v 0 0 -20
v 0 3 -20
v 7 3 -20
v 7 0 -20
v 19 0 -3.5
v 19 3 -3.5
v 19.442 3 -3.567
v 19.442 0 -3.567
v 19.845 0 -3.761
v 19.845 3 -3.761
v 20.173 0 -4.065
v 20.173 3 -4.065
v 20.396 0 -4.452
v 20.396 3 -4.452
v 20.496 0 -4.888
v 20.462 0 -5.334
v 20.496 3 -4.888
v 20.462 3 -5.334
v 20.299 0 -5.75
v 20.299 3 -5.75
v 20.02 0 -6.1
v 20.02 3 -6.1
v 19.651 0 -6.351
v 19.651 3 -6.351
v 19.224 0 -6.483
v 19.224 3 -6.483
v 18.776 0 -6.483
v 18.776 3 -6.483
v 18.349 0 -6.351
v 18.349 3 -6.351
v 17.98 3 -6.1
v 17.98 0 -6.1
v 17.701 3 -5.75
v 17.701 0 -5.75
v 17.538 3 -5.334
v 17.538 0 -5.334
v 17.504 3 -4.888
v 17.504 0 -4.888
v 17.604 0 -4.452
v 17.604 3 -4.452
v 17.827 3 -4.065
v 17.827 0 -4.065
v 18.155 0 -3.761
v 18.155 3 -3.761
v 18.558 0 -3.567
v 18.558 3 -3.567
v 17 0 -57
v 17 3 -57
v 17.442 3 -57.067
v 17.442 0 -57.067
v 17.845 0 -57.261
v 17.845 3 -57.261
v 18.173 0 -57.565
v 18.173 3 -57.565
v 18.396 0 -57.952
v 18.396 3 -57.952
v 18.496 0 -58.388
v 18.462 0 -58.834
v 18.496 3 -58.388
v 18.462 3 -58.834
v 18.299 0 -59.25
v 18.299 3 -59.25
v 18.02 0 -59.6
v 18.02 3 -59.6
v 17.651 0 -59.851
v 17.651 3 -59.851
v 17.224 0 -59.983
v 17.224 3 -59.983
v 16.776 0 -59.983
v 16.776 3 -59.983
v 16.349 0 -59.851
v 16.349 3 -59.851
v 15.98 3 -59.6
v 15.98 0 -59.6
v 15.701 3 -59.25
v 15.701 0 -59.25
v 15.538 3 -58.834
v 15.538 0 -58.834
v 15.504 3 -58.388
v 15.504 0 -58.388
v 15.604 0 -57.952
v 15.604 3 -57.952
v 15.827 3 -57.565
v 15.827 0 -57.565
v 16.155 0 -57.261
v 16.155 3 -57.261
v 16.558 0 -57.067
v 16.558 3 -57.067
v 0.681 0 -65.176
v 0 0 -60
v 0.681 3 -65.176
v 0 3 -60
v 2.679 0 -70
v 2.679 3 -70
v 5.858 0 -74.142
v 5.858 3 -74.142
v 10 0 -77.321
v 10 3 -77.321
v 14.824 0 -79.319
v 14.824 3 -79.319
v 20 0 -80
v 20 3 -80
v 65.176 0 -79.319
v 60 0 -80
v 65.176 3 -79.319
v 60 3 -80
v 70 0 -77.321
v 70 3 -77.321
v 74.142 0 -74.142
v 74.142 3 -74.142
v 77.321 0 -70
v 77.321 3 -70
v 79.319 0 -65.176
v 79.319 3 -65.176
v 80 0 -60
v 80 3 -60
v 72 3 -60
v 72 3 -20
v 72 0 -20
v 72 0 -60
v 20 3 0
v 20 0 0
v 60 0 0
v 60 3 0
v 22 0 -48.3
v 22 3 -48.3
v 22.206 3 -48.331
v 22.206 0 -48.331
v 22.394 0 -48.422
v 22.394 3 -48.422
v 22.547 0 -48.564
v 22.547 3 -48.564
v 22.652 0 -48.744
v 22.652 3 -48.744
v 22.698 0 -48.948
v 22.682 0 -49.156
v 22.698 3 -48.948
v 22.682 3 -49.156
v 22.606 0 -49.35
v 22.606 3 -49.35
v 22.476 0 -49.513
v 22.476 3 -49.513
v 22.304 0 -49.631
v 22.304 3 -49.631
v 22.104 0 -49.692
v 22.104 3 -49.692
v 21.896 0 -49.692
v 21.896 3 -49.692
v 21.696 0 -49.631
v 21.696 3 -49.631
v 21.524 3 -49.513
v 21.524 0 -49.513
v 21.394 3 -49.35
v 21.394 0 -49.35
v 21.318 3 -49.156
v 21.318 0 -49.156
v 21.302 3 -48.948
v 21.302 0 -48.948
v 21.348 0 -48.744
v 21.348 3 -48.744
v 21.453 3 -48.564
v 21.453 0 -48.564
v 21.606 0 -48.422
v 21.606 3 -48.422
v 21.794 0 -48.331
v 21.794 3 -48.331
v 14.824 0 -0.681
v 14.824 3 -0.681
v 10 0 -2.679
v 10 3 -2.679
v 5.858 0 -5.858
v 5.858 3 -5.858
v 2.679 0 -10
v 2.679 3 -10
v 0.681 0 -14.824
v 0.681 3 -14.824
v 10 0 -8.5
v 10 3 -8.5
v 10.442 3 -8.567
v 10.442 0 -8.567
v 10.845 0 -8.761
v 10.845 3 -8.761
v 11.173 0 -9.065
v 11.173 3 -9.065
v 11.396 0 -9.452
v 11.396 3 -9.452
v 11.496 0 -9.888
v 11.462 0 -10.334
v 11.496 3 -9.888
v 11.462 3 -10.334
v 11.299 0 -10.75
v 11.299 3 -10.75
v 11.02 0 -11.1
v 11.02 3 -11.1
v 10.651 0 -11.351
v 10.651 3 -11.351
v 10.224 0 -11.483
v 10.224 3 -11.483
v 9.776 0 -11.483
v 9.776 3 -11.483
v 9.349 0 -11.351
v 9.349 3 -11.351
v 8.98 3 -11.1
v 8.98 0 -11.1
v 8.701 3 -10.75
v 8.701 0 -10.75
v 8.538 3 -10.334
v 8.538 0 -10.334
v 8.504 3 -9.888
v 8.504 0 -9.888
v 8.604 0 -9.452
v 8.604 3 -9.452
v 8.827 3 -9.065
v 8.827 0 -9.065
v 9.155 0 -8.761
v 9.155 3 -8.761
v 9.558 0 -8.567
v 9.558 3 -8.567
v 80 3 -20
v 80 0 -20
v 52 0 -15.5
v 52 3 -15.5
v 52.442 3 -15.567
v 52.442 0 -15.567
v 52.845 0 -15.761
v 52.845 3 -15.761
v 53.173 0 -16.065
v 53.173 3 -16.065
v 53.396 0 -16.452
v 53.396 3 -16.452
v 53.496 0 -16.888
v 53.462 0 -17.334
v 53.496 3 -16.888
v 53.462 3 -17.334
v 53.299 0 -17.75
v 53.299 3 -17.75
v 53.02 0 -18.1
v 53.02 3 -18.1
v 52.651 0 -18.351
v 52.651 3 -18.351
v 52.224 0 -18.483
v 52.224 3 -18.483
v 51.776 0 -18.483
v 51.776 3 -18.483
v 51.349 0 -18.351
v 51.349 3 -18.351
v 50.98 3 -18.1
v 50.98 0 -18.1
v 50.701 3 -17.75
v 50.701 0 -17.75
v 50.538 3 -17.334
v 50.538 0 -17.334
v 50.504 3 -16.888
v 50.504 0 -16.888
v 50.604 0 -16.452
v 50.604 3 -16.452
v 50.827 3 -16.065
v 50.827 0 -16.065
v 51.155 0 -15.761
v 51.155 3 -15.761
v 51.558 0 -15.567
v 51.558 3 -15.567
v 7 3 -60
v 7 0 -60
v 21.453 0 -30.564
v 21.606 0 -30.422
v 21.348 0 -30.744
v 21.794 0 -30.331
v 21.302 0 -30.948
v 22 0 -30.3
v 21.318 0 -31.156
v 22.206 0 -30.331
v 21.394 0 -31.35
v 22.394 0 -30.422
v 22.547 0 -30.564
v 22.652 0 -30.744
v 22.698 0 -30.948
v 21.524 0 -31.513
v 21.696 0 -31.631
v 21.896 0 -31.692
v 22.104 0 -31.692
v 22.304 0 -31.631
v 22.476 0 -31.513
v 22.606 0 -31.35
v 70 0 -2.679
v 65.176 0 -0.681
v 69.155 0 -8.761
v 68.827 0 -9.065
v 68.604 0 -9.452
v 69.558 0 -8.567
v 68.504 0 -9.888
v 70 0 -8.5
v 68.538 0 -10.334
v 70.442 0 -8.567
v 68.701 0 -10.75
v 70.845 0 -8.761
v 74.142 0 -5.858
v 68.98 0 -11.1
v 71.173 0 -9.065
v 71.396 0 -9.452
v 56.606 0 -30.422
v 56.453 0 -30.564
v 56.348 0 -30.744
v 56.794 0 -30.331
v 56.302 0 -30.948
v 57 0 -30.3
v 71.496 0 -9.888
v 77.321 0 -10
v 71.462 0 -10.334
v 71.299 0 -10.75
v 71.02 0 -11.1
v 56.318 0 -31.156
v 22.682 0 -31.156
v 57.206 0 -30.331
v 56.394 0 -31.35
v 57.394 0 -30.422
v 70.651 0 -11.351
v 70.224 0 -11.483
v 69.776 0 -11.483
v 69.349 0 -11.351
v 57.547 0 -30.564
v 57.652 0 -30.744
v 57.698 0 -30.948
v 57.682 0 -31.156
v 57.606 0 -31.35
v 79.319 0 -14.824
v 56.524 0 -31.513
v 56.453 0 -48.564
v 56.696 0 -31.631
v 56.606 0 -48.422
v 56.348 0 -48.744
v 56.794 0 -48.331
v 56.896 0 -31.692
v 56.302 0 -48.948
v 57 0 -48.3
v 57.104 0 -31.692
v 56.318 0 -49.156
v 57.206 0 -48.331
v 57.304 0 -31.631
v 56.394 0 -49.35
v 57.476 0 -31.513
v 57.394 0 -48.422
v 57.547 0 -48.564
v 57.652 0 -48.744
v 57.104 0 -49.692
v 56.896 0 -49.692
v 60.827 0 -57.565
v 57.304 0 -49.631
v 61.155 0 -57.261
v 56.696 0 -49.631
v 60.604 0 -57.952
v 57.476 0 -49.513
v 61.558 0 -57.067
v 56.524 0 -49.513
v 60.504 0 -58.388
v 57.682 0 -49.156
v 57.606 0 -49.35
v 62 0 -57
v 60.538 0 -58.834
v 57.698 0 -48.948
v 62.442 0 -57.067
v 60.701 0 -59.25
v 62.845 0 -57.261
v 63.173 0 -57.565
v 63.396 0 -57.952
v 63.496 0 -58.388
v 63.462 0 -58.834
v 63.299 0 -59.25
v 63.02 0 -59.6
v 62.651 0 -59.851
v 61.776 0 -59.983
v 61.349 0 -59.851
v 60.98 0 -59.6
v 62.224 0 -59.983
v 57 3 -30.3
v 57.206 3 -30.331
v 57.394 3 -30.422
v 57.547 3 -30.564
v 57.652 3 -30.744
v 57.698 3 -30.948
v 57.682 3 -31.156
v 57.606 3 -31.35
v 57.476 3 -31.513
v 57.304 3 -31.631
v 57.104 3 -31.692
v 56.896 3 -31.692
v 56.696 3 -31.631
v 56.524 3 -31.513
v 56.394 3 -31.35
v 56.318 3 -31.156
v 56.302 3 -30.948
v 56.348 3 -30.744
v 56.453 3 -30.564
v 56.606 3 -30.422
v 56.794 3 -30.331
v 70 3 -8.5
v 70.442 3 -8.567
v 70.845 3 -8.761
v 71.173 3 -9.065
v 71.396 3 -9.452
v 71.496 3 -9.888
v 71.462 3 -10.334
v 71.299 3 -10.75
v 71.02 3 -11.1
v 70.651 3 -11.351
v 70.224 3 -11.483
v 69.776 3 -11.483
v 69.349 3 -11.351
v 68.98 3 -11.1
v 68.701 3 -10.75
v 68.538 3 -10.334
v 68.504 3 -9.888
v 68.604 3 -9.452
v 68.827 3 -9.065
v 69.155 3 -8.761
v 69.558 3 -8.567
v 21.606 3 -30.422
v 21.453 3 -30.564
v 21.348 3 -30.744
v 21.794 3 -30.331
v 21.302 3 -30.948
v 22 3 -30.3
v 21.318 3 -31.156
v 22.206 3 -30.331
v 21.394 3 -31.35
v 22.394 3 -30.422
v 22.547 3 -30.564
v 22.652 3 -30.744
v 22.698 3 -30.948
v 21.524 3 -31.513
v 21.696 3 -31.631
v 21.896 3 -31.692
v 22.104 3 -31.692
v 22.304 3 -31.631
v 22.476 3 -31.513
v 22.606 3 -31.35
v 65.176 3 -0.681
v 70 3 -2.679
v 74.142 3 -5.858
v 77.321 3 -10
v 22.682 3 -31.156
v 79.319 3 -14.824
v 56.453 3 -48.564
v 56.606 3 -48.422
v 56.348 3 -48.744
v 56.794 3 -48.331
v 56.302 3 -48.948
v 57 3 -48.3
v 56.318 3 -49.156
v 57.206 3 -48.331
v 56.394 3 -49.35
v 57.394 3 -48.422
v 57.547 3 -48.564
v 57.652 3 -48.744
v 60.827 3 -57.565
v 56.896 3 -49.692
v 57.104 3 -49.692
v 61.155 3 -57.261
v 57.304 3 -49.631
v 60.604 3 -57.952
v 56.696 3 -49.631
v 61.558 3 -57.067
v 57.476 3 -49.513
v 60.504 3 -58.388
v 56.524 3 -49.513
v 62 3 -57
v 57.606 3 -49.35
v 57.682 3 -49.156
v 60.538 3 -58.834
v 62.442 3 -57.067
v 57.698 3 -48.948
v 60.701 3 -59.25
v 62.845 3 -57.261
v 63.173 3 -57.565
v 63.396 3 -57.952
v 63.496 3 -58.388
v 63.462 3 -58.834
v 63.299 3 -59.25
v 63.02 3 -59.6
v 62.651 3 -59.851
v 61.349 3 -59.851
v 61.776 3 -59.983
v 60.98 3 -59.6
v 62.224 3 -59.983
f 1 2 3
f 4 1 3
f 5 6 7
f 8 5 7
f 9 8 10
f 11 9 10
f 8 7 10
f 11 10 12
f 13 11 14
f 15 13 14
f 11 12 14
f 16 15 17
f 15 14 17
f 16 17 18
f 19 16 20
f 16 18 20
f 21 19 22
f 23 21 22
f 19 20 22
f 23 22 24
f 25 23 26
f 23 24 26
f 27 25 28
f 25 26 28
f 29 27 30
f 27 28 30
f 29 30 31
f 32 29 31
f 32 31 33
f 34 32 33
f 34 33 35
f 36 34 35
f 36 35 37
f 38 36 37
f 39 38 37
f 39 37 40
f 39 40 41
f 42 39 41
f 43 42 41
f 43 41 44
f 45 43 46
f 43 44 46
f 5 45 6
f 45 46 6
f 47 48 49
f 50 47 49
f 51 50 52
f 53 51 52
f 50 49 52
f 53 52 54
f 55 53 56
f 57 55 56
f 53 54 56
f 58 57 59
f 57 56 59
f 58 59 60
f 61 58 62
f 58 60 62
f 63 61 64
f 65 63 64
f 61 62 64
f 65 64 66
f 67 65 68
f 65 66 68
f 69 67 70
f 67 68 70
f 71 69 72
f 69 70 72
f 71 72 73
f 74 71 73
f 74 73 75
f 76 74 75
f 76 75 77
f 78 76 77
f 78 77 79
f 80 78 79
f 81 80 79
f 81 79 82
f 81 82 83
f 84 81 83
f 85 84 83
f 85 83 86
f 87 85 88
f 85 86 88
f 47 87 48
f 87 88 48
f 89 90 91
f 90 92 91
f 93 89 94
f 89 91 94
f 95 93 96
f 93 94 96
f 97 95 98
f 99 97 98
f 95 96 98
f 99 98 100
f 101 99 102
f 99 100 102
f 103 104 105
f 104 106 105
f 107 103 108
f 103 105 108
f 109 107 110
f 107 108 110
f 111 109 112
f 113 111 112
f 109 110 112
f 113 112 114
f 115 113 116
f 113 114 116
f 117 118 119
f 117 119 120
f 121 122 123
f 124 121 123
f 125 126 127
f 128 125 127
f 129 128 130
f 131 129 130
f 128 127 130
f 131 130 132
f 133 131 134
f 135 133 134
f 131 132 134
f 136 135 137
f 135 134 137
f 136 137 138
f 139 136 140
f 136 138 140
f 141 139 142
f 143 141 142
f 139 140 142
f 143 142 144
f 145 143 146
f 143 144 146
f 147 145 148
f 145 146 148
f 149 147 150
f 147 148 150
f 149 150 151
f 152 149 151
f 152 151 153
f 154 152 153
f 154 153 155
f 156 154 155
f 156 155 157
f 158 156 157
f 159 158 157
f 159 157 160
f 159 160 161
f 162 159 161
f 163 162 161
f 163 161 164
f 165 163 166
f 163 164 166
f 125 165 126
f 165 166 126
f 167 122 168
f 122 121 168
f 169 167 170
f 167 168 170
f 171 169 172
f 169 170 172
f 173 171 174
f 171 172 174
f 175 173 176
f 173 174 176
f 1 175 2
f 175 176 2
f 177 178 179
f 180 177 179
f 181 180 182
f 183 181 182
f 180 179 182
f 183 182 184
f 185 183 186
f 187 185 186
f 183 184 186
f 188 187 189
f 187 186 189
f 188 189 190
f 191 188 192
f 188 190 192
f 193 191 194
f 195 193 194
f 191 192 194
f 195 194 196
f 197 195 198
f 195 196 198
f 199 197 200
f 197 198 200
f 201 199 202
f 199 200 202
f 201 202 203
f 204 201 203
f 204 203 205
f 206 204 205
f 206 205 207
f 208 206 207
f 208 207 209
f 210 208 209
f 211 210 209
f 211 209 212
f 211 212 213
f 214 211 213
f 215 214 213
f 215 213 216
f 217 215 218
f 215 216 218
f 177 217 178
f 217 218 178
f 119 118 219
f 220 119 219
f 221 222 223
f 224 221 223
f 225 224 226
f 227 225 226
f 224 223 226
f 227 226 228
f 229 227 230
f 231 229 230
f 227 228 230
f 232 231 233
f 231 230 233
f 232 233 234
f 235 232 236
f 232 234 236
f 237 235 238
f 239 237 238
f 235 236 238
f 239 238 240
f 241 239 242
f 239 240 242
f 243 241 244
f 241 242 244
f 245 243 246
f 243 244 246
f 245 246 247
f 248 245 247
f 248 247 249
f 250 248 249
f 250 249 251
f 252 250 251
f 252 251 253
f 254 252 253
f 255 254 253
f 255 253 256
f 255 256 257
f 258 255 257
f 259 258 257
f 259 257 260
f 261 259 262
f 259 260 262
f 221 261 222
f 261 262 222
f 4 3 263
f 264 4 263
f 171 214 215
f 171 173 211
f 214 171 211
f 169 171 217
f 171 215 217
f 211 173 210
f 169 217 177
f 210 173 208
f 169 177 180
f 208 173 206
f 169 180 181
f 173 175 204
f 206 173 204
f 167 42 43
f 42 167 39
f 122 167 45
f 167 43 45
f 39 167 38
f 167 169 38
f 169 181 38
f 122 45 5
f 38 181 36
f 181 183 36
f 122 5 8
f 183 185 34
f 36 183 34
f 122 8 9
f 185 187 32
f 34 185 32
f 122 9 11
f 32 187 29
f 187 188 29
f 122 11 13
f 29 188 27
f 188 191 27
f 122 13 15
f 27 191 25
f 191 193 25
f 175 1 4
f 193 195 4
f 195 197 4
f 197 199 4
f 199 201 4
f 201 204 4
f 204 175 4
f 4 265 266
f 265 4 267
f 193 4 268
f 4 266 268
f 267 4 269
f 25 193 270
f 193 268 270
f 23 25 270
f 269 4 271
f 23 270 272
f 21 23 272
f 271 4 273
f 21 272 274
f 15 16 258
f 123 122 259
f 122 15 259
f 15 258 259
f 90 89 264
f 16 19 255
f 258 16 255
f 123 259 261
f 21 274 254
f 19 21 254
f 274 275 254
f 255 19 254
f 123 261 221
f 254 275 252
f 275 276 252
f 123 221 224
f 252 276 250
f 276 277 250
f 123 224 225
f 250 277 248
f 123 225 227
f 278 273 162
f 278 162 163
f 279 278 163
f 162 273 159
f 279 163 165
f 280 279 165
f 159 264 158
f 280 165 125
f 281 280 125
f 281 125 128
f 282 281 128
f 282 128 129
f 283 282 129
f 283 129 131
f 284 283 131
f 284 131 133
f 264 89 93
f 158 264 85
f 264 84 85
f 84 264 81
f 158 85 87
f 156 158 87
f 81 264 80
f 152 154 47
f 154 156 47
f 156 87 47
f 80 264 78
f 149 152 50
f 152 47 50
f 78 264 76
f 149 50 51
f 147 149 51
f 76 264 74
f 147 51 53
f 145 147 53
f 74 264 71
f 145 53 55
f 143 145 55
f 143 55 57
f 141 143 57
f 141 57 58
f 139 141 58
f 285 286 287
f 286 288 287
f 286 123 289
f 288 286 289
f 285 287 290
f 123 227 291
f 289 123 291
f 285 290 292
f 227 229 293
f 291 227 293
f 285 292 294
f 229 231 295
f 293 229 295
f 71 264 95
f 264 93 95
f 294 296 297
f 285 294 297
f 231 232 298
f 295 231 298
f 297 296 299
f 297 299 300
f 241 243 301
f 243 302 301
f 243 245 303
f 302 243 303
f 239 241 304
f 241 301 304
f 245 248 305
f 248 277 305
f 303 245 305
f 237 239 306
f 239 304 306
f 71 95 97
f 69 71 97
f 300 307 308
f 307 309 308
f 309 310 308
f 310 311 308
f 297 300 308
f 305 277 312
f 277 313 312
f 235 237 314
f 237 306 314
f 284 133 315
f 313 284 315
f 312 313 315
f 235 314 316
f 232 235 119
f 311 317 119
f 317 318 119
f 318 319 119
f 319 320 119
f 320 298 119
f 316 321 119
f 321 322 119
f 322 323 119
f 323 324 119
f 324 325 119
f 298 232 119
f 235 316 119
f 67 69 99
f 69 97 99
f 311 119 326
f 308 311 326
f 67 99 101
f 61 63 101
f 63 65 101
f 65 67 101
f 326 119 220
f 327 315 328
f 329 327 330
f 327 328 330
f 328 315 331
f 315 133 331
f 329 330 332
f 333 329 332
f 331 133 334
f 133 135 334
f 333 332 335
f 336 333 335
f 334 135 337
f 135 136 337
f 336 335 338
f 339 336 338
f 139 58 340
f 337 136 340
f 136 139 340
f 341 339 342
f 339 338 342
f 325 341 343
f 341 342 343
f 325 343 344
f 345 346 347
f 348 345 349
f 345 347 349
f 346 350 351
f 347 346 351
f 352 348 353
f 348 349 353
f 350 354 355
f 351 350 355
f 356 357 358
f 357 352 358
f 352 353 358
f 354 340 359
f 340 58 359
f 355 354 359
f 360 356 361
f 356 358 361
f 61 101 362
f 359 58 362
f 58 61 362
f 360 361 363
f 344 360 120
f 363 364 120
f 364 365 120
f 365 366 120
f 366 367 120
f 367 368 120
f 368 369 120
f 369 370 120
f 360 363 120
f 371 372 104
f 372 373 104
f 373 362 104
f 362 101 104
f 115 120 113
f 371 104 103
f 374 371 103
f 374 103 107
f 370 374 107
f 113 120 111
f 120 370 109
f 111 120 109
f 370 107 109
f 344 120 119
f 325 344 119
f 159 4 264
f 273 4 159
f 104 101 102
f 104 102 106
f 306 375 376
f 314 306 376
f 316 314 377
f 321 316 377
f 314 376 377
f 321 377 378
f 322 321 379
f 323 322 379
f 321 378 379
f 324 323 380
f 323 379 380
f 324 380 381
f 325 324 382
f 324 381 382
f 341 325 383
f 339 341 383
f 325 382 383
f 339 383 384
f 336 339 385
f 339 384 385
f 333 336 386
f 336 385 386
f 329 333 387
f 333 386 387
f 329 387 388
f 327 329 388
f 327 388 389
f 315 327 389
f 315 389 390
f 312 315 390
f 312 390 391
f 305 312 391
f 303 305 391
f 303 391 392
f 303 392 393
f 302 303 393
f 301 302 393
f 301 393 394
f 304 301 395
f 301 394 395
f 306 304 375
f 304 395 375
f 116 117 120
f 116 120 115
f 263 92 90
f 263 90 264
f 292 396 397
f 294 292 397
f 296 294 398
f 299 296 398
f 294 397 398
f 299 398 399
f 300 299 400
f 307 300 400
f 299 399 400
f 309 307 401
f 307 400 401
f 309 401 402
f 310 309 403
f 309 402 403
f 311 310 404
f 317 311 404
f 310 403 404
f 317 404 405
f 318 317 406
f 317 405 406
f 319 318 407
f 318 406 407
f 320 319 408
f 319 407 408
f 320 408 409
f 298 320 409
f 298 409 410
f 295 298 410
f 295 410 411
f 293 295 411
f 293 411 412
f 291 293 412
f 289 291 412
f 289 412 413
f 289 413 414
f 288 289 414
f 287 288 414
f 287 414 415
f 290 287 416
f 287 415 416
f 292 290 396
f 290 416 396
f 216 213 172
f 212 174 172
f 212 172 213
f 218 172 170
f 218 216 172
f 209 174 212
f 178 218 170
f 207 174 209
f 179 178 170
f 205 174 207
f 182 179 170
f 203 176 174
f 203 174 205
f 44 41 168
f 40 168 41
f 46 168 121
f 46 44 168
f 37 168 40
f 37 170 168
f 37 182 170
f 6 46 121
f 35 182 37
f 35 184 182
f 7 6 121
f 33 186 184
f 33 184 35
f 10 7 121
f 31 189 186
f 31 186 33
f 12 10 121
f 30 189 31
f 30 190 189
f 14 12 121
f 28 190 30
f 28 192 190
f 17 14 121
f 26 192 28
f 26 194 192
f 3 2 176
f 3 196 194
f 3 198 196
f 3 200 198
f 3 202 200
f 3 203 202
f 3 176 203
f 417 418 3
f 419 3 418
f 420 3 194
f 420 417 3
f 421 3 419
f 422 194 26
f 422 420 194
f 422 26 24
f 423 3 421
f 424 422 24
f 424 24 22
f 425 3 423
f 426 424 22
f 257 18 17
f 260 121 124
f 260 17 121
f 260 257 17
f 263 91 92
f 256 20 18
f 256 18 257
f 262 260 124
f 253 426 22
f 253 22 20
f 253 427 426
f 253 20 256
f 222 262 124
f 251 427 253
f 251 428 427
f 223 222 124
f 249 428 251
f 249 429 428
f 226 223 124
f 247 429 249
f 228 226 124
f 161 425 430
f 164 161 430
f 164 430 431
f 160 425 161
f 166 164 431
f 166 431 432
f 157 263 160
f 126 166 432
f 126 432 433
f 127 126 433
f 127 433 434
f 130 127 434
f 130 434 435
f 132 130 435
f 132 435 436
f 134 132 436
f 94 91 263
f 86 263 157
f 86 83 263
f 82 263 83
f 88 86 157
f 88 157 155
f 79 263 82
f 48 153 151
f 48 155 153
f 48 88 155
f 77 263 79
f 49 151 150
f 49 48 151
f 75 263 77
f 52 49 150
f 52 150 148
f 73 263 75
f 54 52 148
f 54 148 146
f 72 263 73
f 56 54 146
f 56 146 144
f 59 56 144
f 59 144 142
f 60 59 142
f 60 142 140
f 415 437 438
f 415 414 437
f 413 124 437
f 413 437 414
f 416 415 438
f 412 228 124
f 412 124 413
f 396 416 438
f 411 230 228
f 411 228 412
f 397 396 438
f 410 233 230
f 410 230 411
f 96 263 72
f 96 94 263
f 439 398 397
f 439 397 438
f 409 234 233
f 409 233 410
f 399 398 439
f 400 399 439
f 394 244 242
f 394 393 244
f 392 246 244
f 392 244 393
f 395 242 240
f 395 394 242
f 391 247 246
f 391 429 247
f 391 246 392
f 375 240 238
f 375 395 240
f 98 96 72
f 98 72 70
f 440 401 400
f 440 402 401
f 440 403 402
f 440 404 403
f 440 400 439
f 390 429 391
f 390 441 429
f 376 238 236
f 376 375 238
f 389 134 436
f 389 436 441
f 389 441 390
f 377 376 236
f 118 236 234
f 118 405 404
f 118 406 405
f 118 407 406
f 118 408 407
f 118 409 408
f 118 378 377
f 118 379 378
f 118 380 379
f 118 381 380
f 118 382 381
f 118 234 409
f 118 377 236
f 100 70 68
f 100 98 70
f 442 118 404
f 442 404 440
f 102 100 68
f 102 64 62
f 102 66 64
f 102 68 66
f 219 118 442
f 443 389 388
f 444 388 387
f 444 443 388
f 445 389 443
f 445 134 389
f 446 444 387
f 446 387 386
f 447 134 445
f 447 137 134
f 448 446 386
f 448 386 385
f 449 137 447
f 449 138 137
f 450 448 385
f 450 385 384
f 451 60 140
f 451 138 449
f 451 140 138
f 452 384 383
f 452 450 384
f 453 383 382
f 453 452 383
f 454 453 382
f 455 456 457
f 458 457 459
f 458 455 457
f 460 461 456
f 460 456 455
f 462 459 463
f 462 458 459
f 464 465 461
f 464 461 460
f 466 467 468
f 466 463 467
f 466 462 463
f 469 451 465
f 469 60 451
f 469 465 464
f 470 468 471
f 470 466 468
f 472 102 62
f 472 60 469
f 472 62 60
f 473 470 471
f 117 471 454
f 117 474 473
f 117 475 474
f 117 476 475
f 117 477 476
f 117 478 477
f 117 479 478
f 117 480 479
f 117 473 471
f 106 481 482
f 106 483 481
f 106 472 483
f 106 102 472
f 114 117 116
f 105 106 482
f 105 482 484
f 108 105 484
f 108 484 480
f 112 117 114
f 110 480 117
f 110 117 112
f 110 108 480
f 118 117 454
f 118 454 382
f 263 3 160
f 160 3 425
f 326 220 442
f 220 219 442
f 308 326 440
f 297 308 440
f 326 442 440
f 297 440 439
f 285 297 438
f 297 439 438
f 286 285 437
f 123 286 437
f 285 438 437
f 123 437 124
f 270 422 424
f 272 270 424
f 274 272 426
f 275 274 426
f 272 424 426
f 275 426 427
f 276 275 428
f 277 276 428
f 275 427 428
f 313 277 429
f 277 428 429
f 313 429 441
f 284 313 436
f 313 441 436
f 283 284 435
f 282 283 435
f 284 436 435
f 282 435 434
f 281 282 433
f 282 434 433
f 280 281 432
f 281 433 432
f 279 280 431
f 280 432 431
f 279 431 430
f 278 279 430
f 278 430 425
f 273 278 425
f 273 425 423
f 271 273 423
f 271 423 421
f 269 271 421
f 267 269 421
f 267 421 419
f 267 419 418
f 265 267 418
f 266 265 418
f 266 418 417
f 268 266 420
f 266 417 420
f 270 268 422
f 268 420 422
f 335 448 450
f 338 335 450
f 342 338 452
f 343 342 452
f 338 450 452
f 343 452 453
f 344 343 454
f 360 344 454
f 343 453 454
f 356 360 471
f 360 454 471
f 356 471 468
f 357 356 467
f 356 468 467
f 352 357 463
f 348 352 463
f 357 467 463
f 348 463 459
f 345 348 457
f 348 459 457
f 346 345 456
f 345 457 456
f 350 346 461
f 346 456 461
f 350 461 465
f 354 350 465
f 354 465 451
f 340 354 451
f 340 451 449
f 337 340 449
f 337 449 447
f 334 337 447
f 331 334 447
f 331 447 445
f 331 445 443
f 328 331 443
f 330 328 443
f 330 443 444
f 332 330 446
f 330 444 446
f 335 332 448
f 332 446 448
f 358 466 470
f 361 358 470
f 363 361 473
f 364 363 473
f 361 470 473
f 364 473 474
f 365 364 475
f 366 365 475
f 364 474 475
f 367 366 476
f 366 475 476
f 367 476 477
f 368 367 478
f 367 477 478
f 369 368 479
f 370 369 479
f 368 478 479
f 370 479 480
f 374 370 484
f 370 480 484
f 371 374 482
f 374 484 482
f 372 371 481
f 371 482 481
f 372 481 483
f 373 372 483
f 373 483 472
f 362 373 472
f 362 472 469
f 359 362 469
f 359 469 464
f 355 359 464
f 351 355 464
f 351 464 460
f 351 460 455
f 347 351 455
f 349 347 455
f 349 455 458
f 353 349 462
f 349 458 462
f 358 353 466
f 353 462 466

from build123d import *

# Parameters (mm, degrees)
SKETCH3_W           = 80
SKETCH3_H           = 80
BOSS_EXTRUDE1_DEPTH = 3
SKETCH4_W           = 7
SKETCH4_H           = 40
SKETCH4_W_2         = 8
CUT_EXTRUDE1_DEPTH  = 3
FILLET3_R           = 20
FILLET4_R           = 20
FILLET5_R           = 20
FILLET6_R           = 20
SKETCH6_R           = 1.5
CUT_EXTRUDE2_DEPTH  = 3
SKETCH9_R           = 1.5
CUT_EXTRUDE3_DEPTH  = 3
SKETCH10_R          = 1.5
CUT_EXTRUDE4_DEPTH  = 3
SKETCH11_R          = 0.7
CUT_EXTRUDE5_DEPTH  = 3


with BuildPart() as part:
    # Sketch3 → Boss-Extrude1 (new body)
    with BuildSketch(Plane(origin=(0, 0, 0), x_dir=(1, 0, 0), z_dir=(0, 1, 0))):
        with Locations((40, 40)):
            Rectangle(SKETCH3_W, SKETCH3_H)
    extrude(amount=BOSS_EXTRUDE1_DEPTH)

    # Sketch4 → Cut-Extrude1 (cut)
    with BuildSketch(Plane(origin=(0, 3, 0), x_dir=(1, 0, 0), z_dir=(0, 1, 0))):
        with Locations((3.5, 40)):
            Rectangle(SKETCH4_W, SKETCH4_H)
        with Locations((76, 40)):
            Rectangle(SKETCH4_W_2, SKETCH4_H)
    extrude(amount=-CUT_EXTRUDE1_DEPTH, mode=Mode.SUBTRACT)

    # Fillet3
    fillet3_edges = [part.edges().sort_by_distance(p)[0] for p in [
        (0, 1.5, -80),
    ]]
    fillet(fillet3_edges, radius=FILLET3_R - 0.0001)  # a hair under: the kernel refuses the full size

    # Fillet4
    fillet4_edges = [part.edges().sort_by_distance(p)[0] for p in [
        (80, 1.5, -80),
    ]]
    fillet(fillet4_edges, radius=FILLET4_R - 0.0001)  # a hair under: the kernel refuses the full size

    # Fillet5
    fillet5_edges = [part.edges().sort_by_distance(p)[0] for p in [
        (80, 1.5, 0),
    ]]
    fillet(fillet5_edges, radius=FILLET5_R - 0.0001)  # a hair under: the kernel refuses the full size

    # Fillet6
    fillet6_edges = [part.edges().sort_by_distance(p)[0] for p in [
        (0, 1.5, 0),
    ]]
    fillet(fillet6_edges, radius=FILLET6_R - 0.0001)  # a hair under: the kernel refuses the full size

    # Sketch6 → Cut-Extrude2 (cut)
    with BuildSketch(Plane(origin=(0, 3, 0), x_dir=(1, 0, 0), z_dir=(0, 1, 0))):
        with Locations(Location((17, 58.5, 0), (0, 0, 270))):
            Circle(SKETCH6_R)
        with Locations(Location((62, 58.5, 0), (0, 0, 270))):
            Circle(SKETCH6_R)
    extrude(amount=-CUT_EXTRUDE2_DEPTH, mode=Mode.SUBTRACT)

    # Sketch9 → Cut-Extrude3 (cut)
    with BuildSketch(Plane(origin=(0, 3, 0), x_dir=(1, 0, 0), z_dir=(0, 1, 0))):
        with Locations(Location((70, 10, 0), (0, 0, 270))):
            Circle(SKETCH9_R)
        with Locations(Location((10, 10, 0), (0, 0, 270))):
            Circle(SKETCH9_R)
    extrude(amount=-CUT_EXTRUDE3_DEPTH, mode=Mode.SUBTRACT)

    # Sketch10 → Cut-Extrude4 (cut)
    with BuildSketch(Plane(origin=(0, 3, 0), x_dir=(1, 0, 0), z_dir=(0, 1, 0))):
        with Locations(Location((19, 5, 0), (0, 0, 270))):
            Circle(SKETCH10_R)
        with Locations(Location((52, 17, 0), (0, 0, 270))):
            Circle(SKETCH10_R)
    extrude(amount=-CUT_EXTRUDE4_DEPTH, mode=Mode.SUBTRACT)

    # Sketch11 → Cut-Extrude5 (cut)
    with BuildSketch(Plane(origin=(0, 3, 0), x_dir=(1, 0, 0), z_dir=(0, 1, 0))):
        with Locations(Location((22, 49, 0), (0, 0, 270))):
            Circle(SKETCH11_R)
        with Locations(Location((22, 31, 0), (0, 0, 270))):
            Circle(SKETCH11_R)
        with Locations(Location((57, 49, 0), (0, 0, 270))):
            Circle(SKETCH11_R)
        with Locations(Location((57, 31, 0), (0, 0, 270))):
            Circle(SKETCH11_R)
    extrude(amount=-CUT_EXTRUDE5_DEPTH, mode=Mode.SUBTRACT)


solid = part.part
